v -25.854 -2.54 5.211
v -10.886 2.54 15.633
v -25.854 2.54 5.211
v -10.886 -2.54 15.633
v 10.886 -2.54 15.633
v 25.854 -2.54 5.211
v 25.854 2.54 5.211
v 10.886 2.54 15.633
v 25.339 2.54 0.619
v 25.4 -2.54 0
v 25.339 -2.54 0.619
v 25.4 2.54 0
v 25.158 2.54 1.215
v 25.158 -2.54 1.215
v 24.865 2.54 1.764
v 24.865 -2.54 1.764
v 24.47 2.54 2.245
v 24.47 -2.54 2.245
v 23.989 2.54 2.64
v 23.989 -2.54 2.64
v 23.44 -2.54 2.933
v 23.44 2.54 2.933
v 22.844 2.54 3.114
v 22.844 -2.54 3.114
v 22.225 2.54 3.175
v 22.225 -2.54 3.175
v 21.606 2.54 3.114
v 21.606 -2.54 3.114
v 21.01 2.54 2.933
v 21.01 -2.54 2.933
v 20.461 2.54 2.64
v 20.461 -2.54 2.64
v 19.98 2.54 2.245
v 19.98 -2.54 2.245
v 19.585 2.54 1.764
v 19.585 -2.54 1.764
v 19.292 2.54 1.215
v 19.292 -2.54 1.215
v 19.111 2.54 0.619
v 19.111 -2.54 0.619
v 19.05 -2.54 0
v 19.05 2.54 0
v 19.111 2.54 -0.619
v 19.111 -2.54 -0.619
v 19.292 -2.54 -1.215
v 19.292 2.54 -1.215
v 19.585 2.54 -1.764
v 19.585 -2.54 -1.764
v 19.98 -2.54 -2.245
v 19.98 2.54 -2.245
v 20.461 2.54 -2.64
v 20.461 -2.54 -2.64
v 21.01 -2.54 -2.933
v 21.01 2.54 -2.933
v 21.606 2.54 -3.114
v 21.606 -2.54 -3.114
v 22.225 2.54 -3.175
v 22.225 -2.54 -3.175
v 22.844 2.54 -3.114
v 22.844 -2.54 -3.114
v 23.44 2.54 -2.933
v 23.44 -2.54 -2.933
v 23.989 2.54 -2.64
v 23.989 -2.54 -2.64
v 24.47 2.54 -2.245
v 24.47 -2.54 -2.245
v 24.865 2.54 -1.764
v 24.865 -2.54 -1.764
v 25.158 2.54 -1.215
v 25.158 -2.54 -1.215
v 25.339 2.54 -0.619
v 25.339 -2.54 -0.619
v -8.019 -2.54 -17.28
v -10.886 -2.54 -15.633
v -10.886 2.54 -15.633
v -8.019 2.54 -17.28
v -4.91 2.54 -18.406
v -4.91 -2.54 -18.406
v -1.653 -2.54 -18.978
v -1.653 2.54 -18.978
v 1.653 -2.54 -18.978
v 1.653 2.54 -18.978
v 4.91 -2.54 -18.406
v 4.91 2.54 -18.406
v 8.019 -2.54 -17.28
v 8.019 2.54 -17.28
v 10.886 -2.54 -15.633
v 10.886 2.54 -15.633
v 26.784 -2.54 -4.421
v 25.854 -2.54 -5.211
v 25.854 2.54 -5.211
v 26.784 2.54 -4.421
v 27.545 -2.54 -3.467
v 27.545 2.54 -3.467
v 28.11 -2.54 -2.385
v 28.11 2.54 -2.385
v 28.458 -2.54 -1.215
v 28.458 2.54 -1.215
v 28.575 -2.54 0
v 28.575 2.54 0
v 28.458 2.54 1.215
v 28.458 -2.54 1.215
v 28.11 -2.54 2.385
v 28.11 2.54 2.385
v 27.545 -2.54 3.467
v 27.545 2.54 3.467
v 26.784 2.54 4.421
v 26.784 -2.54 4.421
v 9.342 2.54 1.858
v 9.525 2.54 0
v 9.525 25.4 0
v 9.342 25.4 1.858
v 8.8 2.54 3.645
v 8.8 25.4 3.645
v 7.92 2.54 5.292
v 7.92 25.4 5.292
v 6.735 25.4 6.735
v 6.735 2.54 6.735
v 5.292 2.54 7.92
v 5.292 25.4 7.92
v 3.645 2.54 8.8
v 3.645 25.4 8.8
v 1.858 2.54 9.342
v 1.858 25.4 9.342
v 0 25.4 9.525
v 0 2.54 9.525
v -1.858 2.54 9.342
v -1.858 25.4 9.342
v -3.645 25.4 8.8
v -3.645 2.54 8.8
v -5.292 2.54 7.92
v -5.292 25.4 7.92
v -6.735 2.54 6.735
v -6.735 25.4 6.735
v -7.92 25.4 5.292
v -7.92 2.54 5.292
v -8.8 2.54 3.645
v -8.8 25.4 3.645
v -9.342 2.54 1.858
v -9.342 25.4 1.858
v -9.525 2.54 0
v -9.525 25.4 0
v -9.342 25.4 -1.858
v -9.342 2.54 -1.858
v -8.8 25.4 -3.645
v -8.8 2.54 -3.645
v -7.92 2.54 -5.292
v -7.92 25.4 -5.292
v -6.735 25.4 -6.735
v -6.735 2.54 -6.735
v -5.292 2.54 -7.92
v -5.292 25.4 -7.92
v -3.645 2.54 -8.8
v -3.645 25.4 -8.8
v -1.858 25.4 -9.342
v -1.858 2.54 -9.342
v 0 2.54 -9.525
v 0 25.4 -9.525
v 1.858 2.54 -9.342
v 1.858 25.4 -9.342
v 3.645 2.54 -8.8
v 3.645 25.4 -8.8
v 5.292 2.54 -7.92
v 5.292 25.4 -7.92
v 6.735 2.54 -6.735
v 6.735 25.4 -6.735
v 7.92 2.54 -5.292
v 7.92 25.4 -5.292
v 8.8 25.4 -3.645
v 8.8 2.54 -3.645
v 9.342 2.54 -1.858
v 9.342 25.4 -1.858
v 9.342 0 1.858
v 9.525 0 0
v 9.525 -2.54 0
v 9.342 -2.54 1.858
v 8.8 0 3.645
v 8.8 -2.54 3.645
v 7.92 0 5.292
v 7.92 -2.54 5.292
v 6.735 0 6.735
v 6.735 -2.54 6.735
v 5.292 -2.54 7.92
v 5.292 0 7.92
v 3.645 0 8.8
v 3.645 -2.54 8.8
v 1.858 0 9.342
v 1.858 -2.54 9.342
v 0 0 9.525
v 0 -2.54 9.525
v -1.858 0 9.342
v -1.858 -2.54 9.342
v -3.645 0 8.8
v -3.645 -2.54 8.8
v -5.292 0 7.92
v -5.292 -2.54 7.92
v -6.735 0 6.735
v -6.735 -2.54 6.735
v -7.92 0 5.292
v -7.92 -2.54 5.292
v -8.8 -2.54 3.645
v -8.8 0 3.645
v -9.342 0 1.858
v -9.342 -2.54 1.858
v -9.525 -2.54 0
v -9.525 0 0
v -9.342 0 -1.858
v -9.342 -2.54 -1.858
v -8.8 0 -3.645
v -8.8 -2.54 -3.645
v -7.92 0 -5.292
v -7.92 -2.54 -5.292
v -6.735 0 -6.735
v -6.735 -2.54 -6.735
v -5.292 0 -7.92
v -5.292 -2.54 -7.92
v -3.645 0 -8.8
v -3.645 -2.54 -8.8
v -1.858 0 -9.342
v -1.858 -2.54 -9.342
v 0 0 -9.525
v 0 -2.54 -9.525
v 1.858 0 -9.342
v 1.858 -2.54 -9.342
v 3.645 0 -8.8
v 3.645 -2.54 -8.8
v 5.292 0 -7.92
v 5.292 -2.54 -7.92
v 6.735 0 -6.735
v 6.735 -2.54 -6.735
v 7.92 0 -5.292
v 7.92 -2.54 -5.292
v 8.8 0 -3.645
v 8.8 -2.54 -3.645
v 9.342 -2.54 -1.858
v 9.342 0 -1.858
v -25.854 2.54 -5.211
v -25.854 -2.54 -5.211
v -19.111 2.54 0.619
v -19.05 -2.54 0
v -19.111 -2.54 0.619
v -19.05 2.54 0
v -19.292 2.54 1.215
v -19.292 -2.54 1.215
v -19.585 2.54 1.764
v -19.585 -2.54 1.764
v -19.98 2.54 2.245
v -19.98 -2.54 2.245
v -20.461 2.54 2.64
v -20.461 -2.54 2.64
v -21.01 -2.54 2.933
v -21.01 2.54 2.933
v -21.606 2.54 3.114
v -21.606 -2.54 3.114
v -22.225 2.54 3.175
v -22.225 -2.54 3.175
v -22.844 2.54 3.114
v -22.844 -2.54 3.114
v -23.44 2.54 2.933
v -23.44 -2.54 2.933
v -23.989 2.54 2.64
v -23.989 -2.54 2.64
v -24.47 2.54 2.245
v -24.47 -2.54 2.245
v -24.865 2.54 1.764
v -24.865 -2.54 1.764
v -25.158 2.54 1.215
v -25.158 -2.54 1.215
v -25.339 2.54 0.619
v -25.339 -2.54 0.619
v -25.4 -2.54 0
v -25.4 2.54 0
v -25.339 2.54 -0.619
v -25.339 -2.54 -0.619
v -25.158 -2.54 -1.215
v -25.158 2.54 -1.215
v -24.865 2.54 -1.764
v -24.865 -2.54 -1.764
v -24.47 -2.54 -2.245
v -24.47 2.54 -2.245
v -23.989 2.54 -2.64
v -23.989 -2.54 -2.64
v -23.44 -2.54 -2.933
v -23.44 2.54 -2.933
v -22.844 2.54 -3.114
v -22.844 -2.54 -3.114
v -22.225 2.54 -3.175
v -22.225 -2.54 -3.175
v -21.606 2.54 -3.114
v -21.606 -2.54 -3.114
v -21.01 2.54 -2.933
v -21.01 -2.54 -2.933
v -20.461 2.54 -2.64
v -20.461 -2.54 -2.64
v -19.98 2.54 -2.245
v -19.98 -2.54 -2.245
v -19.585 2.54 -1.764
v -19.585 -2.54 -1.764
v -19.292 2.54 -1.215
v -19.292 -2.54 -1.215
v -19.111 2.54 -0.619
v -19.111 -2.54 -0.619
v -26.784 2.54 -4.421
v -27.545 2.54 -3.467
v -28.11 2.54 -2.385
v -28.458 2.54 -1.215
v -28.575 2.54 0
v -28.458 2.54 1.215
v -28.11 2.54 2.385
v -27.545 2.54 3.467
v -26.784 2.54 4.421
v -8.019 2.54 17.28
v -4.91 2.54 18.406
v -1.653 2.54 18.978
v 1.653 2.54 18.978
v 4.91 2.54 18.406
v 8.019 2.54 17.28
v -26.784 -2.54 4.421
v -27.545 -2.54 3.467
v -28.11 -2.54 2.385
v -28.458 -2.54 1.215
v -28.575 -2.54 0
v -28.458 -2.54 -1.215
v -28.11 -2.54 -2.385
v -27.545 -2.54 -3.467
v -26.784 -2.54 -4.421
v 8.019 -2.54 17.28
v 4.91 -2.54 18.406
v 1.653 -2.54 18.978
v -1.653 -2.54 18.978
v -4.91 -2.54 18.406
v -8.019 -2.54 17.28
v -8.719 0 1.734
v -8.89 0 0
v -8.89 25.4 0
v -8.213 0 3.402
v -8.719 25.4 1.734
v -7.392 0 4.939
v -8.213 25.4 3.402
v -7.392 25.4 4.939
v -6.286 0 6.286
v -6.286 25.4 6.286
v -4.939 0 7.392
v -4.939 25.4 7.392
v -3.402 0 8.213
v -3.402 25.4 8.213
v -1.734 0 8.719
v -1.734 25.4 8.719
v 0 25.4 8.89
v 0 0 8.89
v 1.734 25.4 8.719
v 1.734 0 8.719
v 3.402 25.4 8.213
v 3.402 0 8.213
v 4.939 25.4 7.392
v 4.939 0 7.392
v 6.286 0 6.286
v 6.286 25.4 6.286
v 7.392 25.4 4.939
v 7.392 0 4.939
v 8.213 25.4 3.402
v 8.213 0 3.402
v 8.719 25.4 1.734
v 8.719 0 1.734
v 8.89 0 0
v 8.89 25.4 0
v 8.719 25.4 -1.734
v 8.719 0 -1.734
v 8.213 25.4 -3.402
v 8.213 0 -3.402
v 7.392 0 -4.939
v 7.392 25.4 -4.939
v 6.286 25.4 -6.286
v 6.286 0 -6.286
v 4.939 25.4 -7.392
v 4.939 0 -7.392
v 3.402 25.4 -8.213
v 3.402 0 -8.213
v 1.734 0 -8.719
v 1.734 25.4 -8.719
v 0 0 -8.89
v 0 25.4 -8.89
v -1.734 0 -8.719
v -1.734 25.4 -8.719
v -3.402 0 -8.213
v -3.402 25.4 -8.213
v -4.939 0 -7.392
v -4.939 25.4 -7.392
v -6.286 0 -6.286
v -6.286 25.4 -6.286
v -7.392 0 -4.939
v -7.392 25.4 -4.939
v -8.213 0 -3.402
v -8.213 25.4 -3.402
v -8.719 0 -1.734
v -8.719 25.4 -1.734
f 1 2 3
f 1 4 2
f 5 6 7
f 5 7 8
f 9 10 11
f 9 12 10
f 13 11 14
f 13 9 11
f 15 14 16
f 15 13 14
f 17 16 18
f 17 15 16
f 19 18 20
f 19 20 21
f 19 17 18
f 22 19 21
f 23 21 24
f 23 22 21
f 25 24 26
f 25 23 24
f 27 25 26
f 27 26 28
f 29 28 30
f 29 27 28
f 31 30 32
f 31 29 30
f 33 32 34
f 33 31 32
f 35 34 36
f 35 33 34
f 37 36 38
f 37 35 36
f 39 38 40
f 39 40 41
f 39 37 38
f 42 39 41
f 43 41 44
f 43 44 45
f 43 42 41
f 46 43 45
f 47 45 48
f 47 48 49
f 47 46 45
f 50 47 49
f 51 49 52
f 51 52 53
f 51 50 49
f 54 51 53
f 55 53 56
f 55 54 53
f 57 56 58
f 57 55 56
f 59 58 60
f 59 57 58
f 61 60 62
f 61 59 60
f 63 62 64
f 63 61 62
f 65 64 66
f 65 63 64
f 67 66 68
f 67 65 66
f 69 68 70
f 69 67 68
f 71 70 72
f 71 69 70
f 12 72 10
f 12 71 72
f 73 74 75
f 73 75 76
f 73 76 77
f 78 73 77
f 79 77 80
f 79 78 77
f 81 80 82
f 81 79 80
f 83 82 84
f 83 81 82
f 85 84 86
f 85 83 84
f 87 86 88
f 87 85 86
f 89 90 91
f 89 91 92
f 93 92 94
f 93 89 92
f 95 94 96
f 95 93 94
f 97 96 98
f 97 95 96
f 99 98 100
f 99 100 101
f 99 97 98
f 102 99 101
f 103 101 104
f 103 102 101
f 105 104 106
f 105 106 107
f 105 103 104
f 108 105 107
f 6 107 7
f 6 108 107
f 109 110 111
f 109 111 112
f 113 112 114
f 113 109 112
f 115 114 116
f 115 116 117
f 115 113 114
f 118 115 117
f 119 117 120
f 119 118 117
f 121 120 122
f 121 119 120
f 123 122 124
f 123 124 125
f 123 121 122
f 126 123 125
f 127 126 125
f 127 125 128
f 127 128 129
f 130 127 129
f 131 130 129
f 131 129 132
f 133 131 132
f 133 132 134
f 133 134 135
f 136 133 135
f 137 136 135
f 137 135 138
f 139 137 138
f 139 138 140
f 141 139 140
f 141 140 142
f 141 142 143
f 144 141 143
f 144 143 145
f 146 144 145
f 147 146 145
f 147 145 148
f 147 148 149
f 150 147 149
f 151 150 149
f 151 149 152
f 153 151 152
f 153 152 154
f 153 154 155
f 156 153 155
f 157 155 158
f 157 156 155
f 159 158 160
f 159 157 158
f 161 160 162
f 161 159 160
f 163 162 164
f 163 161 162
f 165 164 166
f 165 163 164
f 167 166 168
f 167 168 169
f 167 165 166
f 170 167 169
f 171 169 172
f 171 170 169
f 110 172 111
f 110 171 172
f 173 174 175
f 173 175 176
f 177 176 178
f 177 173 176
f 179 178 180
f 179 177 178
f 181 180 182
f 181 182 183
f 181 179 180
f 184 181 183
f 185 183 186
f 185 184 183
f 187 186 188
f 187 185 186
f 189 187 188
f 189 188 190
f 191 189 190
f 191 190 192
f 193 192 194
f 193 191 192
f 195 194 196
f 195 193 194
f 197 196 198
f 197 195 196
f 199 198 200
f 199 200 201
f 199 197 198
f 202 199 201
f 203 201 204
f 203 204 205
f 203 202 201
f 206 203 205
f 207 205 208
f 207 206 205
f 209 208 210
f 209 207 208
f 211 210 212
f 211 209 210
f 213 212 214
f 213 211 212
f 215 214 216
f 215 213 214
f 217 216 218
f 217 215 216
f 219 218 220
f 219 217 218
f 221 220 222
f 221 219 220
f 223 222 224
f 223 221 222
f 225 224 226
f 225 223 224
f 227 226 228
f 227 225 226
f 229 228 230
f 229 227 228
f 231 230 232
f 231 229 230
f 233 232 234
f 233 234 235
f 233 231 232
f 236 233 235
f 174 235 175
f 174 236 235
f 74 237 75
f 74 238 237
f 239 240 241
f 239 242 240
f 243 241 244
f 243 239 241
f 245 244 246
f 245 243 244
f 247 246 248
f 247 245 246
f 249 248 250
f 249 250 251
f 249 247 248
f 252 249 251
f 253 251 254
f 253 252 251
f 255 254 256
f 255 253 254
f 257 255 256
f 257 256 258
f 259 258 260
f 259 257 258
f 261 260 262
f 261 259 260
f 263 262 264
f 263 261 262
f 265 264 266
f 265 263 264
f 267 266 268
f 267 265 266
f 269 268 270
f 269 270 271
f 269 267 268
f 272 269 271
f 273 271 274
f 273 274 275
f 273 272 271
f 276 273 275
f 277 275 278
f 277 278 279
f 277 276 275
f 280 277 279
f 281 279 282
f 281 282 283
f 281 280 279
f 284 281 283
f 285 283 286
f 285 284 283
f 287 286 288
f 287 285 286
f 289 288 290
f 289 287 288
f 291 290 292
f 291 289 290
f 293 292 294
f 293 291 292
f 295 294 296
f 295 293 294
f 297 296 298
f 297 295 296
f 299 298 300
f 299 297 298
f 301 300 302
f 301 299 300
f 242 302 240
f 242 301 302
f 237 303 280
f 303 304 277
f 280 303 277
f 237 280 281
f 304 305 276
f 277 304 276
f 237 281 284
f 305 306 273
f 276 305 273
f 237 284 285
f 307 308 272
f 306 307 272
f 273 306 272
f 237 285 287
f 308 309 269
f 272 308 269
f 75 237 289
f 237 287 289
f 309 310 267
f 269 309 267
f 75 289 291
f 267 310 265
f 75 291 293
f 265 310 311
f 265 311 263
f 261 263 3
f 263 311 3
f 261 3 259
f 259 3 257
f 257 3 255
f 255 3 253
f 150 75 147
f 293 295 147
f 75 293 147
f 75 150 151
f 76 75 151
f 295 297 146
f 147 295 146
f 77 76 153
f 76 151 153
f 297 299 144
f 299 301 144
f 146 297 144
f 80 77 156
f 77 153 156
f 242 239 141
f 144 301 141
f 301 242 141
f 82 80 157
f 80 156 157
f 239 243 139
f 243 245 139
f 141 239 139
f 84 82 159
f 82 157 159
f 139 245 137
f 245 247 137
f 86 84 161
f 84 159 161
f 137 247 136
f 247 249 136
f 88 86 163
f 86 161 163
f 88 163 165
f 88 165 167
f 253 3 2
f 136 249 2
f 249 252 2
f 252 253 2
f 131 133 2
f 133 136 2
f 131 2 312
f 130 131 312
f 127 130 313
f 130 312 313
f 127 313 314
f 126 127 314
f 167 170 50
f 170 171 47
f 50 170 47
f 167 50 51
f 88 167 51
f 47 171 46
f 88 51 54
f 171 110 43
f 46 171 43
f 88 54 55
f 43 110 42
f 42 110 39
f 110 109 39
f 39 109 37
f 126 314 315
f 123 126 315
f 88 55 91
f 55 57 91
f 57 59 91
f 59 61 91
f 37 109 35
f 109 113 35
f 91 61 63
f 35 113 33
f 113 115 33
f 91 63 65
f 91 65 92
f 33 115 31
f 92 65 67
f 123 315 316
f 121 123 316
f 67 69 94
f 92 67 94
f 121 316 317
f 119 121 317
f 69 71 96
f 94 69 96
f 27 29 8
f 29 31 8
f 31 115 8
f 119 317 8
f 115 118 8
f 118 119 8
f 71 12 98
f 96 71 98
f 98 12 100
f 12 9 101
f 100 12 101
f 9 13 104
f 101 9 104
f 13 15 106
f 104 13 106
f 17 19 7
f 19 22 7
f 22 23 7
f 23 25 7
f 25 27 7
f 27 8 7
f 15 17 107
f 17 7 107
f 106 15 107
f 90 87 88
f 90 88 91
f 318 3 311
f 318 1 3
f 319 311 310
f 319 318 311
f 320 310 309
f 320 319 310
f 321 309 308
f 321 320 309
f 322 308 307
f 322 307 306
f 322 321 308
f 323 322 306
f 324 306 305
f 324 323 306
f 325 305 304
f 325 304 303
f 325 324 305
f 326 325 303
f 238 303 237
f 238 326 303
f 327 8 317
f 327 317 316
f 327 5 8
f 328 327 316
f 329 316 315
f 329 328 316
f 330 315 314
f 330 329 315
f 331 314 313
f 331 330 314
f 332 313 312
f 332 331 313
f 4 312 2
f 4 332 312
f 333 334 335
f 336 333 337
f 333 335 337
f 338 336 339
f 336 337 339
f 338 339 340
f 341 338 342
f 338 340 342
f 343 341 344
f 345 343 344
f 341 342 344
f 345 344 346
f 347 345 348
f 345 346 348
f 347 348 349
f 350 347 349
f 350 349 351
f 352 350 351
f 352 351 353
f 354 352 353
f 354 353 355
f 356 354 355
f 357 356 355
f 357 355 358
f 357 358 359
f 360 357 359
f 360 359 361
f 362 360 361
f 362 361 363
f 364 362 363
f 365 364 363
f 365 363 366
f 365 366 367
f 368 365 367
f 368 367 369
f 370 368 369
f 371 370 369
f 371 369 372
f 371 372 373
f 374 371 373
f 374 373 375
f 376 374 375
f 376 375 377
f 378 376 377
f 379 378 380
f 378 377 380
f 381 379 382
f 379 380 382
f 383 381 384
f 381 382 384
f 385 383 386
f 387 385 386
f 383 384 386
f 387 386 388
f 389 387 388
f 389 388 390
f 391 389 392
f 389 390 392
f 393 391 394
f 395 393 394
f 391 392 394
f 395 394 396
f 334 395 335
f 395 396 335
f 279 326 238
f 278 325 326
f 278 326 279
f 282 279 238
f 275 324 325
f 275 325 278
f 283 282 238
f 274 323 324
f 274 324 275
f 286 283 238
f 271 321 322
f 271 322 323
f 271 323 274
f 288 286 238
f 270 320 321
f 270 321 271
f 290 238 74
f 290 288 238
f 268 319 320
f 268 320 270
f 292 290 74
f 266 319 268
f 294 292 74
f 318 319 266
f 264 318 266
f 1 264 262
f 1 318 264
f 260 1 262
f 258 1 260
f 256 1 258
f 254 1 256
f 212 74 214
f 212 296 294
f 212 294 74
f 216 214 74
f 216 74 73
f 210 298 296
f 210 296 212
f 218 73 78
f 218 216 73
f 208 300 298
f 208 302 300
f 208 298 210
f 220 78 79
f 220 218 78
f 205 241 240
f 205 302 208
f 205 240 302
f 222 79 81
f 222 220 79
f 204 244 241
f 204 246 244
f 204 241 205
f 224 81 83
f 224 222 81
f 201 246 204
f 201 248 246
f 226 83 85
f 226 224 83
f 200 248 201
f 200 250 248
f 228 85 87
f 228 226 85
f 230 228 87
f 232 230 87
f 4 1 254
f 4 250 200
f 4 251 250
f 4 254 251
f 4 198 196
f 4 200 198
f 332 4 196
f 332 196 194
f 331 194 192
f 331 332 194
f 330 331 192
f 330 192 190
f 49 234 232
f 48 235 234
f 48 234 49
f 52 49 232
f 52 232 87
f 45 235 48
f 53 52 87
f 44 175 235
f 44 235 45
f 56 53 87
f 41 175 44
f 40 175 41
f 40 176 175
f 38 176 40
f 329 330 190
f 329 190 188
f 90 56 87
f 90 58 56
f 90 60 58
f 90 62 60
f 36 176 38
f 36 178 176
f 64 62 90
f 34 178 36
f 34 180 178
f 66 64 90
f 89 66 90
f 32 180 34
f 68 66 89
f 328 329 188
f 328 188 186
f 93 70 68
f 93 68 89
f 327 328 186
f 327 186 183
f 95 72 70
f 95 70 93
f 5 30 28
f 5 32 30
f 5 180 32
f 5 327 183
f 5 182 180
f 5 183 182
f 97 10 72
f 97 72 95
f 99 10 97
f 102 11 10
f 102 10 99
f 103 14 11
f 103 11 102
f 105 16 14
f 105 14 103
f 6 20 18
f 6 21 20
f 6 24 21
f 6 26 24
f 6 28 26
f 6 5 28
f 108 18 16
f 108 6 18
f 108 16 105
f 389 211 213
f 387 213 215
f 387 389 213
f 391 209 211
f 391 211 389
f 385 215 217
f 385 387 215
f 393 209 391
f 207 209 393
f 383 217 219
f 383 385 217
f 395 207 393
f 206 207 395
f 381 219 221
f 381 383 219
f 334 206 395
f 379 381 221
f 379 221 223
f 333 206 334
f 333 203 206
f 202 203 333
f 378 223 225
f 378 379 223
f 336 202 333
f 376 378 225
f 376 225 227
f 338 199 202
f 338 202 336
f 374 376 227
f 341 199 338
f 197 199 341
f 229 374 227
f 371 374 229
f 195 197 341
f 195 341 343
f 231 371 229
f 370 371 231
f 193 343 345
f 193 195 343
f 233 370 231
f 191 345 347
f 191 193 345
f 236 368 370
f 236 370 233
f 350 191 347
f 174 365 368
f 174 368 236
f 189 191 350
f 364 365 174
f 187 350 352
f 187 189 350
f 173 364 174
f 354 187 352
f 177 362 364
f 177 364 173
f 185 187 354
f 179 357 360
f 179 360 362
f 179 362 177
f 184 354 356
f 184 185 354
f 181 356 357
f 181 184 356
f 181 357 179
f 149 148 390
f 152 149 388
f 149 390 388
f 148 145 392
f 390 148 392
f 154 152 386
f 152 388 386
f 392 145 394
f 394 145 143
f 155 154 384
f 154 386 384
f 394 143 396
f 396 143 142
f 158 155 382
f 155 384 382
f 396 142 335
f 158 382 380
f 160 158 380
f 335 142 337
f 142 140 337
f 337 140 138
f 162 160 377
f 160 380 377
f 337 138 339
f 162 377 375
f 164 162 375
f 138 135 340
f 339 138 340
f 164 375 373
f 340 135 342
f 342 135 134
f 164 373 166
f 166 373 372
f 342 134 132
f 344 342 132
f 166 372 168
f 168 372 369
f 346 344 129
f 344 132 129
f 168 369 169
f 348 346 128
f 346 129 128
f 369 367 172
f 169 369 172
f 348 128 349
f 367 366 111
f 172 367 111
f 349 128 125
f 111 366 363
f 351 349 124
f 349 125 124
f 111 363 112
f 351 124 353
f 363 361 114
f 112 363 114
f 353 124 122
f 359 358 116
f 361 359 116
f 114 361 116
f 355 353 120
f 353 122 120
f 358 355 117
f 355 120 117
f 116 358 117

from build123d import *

# Parameters (mm, degrees)
F0_R     = 3.175
F0_R_2   = 9.525
F1_DEPTH = 2.54
F2_DEPTH = 25.4
F3_D     = 17.78


with BuildPart() as f1:
    # F0 (on Front) → F1 (new body, symmetric)
    with BuildSketch(Plane.XZ):
        with BuildLine():
            Line((-25.8535714286, -5.2111389722), (-10.8857142857, -15.6334169166))
            ThreePointArc((-10.8857142857, -15.6334169166), (0, -19.05), (10.8857142857, -15.6334169166))
            Line((10.8857142857, -15.6334169166), (25.8535714286, -5.2111389722))
            ThreePointArc((25.8535714286, -5.2111389722), (28.575, 0), (25.8535714286, 5.2111389722))
            Line((25.8535714286, 5.2111389722), (10.8857142857, 15.6334169166))
            ThreePointArc((10.8857142857, 15.6334169166), (0, 19.05), (-10.8857142857, 15.6334169166))
            Line((-10.8857142857, 15.6334169166), (-25.8535714286, 5.2111389722))
            ThreePointArc((-25.8535714286, 5.2111389722), (-28.575, 0), (-25.8535714286, -5.2111389722))
        make_face()
        with Locations((-22.225, 0)):
            Circle(F0_R, mode=Mode.SUBTRACT)
        Circle(F0_R_2, mode=Mode.SUBTRACT)
        with Locations((22.225, 0)):
            Circle(F0_R, mode=Mode.SUBTRACT)
    extrude(amount=F1_DEPTH, both=True)

    # F0 (on Front) → F2 (join)
    with BuildSketch(Plane.XZ):
        Circle(F0_R_2)
    extrude(amount=-F2_DEPTH)

    # F3 (through all)
    with Locations(Plane.XZ):
        with Locations((0, 0)):
            Hole(F3_D / 2)


solid = f1.part
